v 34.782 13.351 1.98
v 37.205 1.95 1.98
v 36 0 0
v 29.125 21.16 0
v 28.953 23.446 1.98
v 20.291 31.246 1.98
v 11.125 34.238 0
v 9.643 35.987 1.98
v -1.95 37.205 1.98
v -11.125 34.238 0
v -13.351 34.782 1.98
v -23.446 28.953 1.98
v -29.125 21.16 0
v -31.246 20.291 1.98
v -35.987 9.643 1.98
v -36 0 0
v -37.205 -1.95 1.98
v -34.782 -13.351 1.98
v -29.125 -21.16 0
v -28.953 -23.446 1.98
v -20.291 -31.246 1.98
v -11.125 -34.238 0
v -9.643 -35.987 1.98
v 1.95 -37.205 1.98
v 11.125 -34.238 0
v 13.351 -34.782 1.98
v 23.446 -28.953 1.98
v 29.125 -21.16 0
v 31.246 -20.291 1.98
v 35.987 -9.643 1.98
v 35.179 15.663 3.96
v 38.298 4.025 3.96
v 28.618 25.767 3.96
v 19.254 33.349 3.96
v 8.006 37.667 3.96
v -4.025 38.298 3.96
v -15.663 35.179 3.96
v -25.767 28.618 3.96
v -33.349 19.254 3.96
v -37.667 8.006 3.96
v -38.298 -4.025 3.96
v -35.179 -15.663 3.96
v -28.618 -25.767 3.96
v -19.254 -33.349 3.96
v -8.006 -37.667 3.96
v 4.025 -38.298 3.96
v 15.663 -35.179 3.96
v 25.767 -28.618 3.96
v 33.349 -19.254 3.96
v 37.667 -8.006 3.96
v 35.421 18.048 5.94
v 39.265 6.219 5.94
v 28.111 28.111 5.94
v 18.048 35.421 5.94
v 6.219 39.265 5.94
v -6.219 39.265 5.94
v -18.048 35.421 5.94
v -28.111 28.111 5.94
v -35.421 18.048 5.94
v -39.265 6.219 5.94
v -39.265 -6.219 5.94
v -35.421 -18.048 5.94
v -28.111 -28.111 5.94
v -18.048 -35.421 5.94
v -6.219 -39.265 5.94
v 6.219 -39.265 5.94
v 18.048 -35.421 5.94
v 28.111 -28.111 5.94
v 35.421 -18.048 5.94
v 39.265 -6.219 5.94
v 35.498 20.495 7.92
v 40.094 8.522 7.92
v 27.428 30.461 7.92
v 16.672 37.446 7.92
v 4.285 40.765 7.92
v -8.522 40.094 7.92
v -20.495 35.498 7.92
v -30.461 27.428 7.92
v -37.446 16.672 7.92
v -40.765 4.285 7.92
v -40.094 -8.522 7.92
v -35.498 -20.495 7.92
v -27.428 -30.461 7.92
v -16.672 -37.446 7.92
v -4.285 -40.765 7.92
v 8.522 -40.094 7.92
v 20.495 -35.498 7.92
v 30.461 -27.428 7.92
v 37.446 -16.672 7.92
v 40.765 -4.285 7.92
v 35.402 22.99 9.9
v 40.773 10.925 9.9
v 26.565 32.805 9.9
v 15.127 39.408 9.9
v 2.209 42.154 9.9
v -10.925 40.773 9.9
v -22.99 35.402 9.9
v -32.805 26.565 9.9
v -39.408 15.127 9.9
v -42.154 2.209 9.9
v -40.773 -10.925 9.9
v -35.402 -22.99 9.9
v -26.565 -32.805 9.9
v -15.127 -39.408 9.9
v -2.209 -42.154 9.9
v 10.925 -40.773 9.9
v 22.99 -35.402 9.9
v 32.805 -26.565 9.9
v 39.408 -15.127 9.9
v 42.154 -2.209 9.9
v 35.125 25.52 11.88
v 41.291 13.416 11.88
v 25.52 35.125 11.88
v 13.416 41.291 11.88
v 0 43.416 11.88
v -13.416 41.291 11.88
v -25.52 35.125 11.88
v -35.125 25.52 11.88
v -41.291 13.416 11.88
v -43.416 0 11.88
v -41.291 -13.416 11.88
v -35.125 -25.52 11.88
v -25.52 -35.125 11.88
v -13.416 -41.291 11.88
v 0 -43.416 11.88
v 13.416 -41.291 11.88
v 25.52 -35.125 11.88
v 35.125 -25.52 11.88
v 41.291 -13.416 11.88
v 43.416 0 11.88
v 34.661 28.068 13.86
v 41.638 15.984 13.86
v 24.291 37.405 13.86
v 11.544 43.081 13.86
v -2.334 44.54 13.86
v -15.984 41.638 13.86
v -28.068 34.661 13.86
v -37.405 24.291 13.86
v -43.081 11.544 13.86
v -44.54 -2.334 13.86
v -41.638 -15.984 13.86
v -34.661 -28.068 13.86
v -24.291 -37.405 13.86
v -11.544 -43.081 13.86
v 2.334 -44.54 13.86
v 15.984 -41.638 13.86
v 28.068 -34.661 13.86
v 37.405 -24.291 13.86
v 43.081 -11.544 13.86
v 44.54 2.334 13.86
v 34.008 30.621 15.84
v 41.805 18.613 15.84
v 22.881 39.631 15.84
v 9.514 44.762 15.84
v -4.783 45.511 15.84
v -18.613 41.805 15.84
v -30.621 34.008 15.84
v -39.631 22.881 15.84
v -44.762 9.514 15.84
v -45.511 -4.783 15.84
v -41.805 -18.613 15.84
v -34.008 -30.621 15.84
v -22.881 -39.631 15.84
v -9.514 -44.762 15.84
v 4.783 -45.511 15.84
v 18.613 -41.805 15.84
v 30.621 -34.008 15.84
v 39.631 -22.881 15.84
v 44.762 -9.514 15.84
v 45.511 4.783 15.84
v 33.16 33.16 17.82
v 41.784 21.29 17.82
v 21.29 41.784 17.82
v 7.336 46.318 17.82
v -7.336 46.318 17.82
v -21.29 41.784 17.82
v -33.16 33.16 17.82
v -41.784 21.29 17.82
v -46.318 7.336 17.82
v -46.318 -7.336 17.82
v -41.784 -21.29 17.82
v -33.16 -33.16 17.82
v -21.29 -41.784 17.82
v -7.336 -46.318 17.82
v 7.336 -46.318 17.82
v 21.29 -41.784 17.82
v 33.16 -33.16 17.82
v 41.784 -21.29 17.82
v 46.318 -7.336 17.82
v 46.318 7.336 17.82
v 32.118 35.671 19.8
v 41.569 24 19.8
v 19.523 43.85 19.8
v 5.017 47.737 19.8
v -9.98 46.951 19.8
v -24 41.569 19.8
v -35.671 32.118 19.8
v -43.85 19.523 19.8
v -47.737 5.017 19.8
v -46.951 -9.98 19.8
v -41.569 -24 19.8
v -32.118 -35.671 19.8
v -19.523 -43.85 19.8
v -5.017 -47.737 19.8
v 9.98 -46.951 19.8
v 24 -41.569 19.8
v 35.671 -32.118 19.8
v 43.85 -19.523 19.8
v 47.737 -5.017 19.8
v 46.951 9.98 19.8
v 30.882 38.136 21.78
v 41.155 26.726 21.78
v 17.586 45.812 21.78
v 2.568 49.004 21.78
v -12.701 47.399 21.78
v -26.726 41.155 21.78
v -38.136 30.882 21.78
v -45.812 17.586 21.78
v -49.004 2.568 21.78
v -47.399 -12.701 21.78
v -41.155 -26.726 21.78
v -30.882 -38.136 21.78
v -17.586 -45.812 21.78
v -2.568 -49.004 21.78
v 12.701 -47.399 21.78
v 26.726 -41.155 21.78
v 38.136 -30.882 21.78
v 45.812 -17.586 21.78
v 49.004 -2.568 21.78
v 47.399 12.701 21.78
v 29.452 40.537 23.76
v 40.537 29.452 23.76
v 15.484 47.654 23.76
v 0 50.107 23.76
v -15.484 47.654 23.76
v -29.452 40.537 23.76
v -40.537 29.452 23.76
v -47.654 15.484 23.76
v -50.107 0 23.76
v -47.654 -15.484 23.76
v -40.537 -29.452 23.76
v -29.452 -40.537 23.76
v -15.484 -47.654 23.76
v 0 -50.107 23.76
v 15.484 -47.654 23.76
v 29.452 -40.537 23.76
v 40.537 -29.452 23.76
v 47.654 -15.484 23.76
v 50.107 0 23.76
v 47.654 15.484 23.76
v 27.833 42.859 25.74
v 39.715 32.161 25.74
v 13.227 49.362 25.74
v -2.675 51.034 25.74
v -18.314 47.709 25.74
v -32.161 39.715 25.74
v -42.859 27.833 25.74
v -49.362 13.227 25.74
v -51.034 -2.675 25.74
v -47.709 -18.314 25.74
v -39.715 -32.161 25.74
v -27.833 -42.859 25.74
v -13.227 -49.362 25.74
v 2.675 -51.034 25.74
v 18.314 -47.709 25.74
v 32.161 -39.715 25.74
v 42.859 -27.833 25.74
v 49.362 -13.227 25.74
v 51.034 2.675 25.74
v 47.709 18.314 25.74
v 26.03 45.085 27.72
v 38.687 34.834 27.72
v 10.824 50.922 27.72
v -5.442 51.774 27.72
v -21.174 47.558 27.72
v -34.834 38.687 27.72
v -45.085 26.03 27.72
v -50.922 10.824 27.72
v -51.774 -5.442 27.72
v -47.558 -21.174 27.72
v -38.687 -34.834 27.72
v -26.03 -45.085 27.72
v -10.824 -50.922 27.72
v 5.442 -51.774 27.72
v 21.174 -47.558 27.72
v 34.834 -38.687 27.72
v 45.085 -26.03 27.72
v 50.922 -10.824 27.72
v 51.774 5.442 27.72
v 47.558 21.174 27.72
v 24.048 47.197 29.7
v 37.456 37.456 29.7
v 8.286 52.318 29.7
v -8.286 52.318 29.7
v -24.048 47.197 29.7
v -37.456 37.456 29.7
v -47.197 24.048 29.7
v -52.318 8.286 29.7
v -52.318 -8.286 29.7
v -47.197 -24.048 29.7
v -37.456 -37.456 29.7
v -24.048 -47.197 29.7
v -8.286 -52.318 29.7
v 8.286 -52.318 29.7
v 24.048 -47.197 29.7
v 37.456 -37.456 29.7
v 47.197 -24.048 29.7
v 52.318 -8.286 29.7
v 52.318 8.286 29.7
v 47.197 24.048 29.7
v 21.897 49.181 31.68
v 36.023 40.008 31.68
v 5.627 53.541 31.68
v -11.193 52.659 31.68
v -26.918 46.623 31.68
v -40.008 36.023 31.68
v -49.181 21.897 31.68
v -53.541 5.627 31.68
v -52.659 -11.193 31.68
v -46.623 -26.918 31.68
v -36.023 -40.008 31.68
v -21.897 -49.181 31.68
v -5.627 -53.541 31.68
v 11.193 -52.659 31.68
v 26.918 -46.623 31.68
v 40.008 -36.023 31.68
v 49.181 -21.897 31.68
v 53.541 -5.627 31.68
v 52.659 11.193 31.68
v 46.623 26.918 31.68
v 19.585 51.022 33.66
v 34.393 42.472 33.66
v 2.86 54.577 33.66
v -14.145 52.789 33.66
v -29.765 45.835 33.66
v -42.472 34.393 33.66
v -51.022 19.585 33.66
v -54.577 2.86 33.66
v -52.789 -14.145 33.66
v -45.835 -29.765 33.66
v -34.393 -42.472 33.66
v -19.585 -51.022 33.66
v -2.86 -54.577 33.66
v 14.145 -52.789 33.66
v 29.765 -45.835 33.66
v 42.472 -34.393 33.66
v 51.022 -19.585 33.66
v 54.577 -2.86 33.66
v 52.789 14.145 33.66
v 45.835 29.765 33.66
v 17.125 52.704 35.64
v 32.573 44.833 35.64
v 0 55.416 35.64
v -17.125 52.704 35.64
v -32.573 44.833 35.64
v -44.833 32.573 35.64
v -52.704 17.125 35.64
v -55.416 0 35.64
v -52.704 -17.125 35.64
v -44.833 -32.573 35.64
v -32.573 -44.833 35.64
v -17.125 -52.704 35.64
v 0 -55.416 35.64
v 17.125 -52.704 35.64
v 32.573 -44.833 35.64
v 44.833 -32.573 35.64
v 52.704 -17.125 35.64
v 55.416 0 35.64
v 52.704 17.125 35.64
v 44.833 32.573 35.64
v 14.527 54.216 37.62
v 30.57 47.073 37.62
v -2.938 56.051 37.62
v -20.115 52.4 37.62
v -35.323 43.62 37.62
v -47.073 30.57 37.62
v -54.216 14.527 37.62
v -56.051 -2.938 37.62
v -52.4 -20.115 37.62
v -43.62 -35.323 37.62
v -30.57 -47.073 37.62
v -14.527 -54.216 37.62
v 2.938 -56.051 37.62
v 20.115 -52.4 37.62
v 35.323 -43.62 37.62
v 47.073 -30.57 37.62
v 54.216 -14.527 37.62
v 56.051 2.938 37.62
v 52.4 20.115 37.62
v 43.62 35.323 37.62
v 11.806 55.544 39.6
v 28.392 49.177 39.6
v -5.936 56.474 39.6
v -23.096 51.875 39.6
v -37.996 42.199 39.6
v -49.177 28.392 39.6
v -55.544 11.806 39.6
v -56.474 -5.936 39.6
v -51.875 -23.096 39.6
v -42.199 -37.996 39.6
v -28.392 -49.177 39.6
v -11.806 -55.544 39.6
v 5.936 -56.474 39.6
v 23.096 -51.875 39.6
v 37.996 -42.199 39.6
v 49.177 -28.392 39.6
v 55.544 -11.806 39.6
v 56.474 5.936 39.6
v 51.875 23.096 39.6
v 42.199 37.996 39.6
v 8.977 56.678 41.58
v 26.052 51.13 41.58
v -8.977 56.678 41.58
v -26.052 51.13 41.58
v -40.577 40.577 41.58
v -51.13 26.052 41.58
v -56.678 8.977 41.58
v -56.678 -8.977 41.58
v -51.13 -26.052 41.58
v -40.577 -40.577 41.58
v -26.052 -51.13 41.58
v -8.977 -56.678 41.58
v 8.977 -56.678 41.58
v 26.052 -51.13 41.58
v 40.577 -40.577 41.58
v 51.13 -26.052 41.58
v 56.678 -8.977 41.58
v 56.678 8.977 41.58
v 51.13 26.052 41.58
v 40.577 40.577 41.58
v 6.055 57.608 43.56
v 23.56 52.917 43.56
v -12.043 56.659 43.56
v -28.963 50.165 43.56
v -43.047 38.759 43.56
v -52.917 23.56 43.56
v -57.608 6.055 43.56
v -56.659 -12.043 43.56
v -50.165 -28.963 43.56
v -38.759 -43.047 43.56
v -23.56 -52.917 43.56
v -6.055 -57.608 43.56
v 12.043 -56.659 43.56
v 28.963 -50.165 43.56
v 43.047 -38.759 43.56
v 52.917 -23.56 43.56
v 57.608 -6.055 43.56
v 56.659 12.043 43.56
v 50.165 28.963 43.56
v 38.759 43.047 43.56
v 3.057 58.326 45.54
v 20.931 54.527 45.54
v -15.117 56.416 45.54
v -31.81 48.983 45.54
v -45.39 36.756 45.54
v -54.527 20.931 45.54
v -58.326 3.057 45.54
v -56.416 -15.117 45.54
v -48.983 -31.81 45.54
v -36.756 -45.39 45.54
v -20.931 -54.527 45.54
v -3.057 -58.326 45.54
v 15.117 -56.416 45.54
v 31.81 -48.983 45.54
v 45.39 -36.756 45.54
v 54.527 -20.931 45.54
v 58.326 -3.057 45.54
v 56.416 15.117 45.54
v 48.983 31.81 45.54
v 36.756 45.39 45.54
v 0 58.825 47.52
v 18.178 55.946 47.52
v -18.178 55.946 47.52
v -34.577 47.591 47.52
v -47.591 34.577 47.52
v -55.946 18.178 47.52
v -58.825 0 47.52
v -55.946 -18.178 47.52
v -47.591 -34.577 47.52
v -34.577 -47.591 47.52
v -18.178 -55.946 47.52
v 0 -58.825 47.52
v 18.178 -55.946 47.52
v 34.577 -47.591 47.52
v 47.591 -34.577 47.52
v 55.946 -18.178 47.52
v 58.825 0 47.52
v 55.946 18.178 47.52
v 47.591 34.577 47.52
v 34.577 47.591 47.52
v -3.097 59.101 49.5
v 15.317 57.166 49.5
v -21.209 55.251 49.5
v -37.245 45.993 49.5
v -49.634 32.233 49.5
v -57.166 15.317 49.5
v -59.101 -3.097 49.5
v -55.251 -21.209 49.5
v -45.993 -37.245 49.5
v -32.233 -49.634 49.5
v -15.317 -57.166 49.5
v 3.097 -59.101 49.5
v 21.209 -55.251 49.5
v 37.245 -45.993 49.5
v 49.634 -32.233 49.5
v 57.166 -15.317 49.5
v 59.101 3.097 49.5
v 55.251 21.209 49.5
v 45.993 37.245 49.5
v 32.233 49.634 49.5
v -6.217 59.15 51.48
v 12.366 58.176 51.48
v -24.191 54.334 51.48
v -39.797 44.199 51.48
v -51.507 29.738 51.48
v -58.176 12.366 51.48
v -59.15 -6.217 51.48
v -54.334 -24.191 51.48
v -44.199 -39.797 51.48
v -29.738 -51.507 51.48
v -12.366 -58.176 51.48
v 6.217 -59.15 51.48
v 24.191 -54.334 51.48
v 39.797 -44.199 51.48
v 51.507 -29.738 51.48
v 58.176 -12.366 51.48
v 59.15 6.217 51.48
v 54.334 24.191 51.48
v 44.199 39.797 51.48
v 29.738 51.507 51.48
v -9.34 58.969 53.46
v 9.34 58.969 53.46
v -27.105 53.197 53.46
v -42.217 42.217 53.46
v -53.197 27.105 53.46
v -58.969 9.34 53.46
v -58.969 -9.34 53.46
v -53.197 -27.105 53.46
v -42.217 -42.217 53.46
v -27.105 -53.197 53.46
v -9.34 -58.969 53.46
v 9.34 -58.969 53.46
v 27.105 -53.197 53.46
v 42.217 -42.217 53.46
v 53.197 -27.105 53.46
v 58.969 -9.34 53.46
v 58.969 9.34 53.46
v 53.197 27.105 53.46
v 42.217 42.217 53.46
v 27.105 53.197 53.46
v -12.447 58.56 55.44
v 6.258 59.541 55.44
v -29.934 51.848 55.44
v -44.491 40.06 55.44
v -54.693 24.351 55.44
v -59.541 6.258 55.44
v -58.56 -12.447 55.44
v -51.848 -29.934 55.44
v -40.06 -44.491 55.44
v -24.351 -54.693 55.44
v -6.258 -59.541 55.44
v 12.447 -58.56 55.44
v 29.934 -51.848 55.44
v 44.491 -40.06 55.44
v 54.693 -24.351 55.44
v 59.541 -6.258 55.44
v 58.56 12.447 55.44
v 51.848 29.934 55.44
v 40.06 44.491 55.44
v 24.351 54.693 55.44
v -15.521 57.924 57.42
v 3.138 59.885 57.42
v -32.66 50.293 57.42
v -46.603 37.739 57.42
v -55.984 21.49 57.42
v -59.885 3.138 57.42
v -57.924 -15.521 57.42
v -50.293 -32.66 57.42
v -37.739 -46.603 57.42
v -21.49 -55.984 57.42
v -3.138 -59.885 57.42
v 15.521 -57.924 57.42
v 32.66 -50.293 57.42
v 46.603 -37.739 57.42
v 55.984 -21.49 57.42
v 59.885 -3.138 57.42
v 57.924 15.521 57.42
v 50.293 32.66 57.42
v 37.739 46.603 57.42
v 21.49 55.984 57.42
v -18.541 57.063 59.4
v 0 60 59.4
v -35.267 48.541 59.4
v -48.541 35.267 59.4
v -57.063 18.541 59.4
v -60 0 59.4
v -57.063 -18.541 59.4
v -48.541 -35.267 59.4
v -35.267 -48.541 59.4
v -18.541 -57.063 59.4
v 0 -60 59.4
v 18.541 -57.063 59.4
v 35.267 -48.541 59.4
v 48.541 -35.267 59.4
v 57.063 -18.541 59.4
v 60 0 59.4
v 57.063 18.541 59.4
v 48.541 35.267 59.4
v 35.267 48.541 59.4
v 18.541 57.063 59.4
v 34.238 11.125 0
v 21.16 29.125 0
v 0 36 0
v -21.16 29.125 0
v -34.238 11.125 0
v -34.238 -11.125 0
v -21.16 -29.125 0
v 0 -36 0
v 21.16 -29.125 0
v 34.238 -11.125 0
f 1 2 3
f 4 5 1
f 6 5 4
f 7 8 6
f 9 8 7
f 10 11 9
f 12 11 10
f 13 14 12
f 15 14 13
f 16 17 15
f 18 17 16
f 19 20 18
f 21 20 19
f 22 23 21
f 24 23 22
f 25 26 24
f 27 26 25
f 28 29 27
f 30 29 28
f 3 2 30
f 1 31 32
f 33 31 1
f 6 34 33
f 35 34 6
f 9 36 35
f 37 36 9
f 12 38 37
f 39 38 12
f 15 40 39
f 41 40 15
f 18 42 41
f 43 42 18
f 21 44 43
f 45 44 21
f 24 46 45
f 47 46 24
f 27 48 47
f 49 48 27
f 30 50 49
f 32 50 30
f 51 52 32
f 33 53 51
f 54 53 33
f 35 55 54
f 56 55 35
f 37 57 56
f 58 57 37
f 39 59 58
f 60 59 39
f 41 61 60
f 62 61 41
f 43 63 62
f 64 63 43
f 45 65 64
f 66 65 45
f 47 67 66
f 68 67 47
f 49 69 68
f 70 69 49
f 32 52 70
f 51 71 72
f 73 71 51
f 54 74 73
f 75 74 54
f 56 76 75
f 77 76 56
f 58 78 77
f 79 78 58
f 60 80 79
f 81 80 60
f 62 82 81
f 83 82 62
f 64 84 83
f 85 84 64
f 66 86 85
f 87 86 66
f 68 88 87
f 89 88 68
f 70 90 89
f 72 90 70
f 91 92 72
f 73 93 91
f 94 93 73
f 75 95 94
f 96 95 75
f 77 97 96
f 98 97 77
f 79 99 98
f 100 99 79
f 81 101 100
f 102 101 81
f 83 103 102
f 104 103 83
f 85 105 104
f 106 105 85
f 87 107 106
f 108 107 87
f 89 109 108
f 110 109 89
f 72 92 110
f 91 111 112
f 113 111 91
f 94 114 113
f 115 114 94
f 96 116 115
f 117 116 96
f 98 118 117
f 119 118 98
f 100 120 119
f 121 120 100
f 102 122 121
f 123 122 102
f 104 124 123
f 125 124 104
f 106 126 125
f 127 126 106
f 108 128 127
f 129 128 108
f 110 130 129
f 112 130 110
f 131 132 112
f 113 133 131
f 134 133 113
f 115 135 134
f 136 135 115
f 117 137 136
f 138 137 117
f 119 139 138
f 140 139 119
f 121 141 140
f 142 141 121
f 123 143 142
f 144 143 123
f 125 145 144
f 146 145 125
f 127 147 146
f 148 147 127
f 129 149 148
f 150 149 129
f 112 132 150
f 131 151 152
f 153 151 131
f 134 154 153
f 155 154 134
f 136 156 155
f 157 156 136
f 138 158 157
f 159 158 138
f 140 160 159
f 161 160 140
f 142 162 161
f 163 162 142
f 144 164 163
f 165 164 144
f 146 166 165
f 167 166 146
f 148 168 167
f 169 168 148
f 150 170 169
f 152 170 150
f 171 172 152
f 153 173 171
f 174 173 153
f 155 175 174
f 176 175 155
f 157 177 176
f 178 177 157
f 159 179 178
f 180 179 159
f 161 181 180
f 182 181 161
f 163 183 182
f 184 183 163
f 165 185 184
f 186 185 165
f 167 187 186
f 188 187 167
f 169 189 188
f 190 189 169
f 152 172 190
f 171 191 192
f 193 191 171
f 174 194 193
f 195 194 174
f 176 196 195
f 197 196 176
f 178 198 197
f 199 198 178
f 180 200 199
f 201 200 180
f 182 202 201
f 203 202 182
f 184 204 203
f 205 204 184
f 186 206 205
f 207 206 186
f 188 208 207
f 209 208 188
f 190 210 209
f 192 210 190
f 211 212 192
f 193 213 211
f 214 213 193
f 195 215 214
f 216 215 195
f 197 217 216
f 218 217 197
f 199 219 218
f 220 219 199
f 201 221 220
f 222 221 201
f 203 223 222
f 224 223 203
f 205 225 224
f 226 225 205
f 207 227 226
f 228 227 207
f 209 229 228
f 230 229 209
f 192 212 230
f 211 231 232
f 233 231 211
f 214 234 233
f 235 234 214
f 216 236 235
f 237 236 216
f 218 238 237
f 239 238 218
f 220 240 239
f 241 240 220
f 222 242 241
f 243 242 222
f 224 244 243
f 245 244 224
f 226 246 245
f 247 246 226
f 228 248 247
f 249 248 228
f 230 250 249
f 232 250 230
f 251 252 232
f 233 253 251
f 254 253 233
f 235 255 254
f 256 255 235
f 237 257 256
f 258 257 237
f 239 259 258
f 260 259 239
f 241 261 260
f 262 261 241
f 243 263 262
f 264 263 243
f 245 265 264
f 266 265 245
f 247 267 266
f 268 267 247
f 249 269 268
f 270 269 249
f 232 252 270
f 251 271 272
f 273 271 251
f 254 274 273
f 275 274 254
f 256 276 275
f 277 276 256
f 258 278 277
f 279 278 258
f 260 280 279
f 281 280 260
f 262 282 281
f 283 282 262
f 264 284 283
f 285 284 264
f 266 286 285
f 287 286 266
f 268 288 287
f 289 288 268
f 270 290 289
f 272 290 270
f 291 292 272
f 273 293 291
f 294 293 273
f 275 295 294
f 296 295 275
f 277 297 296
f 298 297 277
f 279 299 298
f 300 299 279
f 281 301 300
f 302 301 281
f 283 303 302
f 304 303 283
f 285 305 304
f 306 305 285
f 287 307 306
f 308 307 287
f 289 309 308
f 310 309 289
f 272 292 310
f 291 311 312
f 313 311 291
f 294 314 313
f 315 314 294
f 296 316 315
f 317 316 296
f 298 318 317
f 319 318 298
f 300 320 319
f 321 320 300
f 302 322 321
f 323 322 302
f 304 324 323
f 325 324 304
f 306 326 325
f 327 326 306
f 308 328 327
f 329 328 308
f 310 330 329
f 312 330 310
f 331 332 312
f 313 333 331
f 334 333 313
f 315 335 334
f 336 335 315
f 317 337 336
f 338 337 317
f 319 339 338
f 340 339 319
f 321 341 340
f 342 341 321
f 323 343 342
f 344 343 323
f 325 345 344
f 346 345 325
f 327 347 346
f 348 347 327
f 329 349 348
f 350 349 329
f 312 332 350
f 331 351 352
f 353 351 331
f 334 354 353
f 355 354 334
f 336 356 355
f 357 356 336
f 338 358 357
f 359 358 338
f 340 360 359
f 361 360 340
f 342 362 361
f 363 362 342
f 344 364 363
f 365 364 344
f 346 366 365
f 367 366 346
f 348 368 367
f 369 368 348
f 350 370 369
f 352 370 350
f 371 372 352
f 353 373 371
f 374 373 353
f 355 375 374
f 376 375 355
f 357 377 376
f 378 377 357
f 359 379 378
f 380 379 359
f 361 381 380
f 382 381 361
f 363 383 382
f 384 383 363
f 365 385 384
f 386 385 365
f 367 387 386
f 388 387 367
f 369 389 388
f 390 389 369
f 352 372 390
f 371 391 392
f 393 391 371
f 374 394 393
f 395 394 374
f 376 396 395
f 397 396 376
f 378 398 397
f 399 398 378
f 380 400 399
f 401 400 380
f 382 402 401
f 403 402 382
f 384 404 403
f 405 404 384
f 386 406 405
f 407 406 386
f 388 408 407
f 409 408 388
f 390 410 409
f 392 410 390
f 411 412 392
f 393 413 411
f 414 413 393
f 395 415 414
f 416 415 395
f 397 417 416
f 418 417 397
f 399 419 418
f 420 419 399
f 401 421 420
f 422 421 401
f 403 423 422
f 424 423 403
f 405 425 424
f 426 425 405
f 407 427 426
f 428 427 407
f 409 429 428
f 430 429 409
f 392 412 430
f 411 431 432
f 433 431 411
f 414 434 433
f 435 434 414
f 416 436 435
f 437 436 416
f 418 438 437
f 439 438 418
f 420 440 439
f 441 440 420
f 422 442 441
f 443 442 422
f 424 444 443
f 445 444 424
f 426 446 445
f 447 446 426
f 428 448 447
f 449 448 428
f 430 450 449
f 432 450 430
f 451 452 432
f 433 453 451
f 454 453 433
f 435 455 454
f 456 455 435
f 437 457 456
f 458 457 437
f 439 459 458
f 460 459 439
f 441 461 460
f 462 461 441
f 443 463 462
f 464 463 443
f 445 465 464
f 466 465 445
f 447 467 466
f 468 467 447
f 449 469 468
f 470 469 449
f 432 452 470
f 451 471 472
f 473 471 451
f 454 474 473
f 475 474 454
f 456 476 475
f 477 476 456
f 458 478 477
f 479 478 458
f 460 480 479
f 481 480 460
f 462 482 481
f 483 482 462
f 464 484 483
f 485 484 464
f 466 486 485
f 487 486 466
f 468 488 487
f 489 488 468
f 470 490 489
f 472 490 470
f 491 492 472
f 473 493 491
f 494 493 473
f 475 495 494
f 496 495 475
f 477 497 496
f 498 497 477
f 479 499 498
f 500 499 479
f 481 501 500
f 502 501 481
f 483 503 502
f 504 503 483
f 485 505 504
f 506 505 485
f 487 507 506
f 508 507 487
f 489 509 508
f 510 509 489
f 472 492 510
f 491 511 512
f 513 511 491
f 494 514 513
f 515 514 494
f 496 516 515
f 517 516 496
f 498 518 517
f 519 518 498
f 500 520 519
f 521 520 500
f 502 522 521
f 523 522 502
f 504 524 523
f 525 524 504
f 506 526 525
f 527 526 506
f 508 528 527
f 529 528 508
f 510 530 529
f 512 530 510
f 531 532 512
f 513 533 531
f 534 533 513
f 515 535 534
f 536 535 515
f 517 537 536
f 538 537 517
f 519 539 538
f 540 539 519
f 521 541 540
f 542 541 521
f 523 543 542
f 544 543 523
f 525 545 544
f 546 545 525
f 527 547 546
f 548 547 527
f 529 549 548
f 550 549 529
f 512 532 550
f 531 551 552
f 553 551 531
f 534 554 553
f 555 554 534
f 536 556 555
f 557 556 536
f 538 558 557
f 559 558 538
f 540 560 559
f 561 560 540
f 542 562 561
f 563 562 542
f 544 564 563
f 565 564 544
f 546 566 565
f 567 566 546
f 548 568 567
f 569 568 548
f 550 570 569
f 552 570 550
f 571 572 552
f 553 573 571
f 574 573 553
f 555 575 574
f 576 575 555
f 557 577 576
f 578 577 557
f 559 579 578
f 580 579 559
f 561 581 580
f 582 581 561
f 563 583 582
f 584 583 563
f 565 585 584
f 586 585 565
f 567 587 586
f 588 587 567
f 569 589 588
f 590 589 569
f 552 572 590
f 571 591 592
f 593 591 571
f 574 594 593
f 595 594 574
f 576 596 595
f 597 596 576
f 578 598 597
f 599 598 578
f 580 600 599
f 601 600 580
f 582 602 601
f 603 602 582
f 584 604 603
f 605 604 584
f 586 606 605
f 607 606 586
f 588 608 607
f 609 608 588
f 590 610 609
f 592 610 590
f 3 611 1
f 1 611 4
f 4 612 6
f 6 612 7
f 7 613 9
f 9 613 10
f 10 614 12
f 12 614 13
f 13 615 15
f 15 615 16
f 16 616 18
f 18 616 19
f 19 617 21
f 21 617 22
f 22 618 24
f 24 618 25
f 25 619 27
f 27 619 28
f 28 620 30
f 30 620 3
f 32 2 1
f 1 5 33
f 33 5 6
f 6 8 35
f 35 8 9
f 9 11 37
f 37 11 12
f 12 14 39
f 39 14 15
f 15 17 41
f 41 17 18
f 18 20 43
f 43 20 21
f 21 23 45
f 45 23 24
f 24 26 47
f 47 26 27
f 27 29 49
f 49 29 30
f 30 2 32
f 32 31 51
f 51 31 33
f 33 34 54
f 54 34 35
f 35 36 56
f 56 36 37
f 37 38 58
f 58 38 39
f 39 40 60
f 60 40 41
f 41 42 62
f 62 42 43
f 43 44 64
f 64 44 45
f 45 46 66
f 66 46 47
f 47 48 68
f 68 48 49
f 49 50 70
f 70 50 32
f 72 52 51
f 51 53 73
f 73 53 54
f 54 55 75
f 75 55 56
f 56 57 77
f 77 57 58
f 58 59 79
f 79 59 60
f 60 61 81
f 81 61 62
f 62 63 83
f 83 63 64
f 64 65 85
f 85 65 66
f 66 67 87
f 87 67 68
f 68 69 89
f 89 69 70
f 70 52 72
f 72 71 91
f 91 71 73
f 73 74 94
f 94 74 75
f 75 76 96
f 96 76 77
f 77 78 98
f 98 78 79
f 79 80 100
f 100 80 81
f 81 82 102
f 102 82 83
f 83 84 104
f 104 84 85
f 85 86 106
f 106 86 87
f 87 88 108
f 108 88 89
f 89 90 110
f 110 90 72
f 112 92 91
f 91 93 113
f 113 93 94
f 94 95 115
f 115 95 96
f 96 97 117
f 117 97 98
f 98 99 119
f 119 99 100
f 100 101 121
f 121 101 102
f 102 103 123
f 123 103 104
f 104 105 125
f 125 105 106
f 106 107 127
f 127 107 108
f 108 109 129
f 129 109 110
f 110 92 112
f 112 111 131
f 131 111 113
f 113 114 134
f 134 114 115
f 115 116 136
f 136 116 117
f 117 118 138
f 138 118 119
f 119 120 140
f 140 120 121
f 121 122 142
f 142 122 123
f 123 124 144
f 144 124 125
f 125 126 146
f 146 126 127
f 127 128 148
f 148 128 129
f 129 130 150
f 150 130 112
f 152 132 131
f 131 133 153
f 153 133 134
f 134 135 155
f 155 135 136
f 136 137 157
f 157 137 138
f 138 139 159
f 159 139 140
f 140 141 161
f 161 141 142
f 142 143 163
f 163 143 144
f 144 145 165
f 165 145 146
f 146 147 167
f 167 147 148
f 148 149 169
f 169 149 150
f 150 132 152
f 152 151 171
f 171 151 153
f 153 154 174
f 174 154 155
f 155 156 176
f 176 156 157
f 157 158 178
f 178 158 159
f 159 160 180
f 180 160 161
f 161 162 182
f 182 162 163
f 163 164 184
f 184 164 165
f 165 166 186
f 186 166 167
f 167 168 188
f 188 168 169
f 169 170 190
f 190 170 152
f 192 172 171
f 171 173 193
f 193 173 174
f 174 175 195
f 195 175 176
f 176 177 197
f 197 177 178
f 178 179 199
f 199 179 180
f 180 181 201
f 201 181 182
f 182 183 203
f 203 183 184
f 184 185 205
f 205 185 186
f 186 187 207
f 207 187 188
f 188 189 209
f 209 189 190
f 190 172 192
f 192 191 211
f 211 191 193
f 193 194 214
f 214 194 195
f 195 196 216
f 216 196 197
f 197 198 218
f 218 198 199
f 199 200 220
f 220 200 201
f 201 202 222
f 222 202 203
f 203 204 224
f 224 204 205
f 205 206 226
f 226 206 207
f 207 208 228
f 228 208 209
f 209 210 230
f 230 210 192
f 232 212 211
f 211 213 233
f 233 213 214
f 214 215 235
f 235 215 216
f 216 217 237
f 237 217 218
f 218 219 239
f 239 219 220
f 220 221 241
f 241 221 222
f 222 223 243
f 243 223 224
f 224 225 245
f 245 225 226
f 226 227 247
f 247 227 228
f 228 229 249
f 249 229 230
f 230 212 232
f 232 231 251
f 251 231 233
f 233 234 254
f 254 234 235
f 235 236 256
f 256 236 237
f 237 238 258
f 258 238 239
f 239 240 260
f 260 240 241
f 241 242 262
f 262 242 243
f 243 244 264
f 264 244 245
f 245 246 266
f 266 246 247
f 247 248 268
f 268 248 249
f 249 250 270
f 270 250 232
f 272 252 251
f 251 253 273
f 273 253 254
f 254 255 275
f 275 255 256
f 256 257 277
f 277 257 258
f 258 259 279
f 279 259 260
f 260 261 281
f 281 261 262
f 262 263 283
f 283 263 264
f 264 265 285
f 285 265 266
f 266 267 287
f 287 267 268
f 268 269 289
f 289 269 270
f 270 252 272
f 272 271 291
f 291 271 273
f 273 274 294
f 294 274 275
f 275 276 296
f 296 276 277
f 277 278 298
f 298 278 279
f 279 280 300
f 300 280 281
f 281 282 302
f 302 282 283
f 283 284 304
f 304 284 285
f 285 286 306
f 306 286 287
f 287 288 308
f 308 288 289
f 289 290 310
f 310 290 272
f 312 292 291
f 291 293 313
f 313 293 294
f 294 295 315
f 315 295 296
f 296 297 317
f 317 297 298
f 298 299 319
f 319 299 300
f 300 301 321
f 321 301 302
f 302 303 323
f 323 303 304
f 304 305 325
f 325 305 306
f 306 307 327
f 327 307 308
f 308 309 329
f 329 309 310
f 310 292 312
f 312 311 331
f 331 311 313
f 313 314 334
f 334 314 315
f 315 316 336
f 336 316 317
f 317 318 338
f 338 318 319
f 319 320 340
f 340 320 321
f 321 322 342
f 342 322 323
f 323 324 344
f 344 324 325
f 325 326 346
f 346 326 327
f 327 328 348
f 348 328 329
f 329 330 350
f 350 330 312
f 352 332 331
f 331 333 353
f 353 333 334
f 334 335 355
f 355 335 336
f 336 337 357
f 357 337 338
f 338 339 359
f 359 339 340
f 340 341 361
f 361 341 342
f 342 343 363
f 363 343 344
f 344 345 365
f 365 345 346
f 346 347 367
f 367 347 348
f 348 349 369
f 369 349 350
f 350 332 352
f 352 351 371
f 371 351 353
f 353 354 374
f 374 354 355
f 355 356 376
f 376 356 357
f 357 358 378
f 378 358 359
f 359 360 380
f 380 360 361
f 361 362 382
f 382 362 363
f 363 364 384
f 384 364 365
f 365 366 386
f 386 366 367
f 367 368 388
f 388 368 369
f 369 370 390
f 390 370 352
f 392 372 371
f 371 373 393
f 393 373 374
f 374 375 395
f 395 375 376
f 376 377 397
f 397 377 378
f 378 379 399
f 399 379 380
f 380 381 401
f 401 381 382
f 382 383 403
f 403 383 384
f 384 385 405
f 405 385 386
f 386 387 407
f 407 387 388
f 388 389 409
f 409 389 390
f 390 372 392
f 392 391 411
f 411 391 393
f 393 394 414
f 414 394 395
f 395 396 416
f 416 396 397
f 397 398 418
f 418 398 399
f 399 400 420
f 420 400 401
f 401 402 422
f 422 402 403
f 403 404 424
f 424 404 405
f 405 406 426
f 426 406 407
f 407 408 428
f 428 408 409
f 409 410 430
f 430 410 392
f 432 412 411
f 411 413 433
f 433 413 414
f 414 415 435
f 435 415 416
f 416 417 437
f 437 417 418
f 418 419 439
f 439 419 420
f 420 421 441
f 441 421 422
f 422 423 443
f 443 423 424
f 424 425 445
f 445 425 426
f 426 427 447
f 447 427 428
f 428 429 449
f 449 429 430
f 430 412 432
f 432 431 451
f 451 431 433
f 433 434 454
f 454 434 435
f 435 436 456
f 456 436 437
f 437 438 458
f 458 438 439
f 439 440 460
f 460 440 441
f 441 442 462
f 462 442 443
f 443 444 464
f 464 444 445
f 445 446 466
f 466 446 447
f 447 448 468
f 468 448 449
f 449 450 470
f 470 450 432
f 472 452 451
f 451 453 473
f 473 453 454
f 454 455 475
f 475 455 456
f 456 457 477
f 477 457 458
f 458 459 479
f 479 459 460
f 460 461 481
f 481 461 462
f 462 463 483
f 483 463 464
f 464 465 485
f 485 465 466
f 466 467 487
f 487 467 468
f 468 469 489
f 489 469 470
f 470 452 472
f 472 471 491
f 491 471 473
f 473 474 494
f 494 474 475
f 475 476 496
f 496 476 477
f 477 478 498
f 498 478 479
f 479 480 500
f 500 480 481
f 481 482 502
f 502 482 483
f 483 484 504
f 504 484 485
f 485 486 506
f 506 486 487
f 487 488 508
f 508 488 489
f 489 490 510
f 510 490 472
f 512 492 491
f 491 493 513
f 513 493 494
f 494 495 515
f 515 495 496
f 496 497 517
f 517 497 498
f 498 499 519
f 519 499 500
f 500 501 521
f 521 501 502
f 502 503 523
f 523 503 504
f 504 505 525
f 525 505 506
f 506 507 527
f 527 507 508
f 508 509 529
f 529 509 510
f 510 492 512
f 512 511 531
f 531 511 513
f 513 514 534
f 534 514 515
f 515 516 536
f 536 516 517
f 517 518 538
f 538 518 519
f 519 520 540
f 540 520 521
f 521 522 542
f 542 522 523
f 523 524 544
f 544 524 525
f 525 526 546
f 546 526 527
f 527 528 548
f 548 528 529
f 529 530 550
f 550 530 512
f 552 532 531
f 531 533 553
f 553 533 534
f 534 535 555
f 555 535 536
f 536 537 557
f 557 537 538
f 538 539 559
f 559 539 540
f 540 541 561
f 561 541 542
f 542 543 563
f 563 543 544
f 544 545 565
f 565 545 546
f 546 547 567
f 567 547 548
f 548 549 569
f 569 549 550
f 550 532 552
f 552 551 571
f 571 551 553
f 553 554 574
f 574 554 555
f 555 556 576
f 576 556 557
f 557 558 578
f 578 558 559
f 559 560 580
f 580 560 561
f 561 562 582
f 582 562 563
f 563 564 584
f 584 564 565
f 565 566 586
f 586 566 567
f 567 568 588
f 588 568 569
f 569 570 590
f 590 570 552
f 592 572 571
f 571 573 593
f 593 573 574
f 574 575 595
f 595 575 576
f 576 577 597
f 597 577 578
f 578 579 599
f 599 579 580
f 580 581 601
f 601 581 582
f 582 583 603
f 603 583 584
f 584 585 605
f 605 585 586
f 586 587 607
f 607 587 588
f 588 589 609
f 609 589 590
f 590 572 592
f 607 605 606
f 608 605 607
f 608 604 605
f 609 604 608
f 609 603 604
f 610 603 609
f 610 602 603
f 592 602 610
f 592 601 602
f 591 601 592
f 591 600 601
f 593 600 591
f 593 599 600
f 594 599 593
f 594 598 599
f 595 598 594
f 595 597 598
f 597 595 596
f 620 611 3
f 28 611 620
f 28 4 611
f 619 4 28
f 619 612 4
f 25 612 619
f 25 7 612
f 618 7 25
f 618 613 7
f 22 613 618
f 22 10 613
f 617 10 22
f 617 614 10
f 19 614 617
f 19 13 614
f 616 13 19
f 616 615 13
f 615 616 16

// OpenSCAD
/*

LOW POLY VASE FACTORY

Fernando Jerez 2017
License: CC


*/

// Style / Shape
shape = "bowl"; // [cylinder: Cylinder, vase1:Vase, vase2:Vase 2, glass: Glass, bowl:Bowl, cup1: Cup, cup2: Cup 2, cone: Cone ]

// Radius 
radius= 60; // [20:100]

// Spike size
spikes = 0; //[-20:20]

// Number of Sides
sides = 20; // [3:30]

// Number of Levels
levels = 30; // [3:30]

// Twisting factor
twist = 0.5; //[-1:0.1:1]

/* [Hidden] */

vase();

module vase(){

altura = 180 - 180%levels; // z-steps
step = floor(180/levels); // resolution in Z (1 is the best and slower)

 
stepc = 360/sides; // Don't touch!

puntos = [
    for(z = [0:step:altura])
        for(i = [0:stepc:359])
            let(

                
                // shape 
                zrad  = (shape=="cylinder") ? 1 :
                        (shape=="vase1")    ? 0.7+ 0.4*sin(z*1.9) :
                        (shape=="vase2")    ? 0.6+ 0.4*pow(sin(z+60),2) :
                        (shape=="glass")    ? 0.6+ 0.4*pow(sin(z*0.7-30),2) :
                        (shape=="cup1")      ? 0.65+ 0.3 * cos(z*2+35) :
                        (shape=="cup2")     ? 0.6+ 0.35*cos(180 - z+50)*sin(180-z*2.5+45) :
                        (shape=="bowl")     ? 0.6+ 0.4 * sin(z*0.5) :
                        cos(z*0.5),
        
                rad2  = ((z/step)%2==1 && (i/stepc)%2==1)?spikes:0,
                g = z*twist,
                
                // vertex
                r     = rad2+  zrad* radius, 
                px    = r*cos(i+g),
                py    = r*sin(i+g)
        
            )
        
            [px,py,z]
];
        
caras = concat(
    [
    for(z = [0:(altura/step)-1])
        for(s = [0:sides-1])
            let(
                // clockwise from left-down corner
                f1 = s + sides*z,
                f2 = s + sides*(z+1),
                f3 = ((s+1) % sides) + sides*(z+1),
                f4 = ((s+1) % sides) + sides*z
            )
        
            ( (s+z)%2==0) ? [f1,f2,f3] : [f2,f3,f4]
 
    ],
    [
    for(z = [0:(altura/step)-1])
        for(s = [0:sides-1])
            let(
                // clockwise from left-down corner
                f1 = s + sides*z,
                f2 = s + sides*(z+1),
                f3 = ((s+1) % sides) + sides*(z+1),
                f4 = ((s+1) % sides) + sides*z
            )
            ( (s+z)%2==0) ? [f3,f4,f1] : [f4,f1,f2]
         
    ],
   
    (shape!="cone")?[[ for(s = [sides-1:-1:0]) (altura/step)*(sides) + s]]:[], //top
    [[ for(s = [0:sides-1]) s]] //bottom
        
 );       
 scale([1,1,(shape=="bowl")?0.33:1])    
 polyhedron (points=puntos,faces = caras);

}
